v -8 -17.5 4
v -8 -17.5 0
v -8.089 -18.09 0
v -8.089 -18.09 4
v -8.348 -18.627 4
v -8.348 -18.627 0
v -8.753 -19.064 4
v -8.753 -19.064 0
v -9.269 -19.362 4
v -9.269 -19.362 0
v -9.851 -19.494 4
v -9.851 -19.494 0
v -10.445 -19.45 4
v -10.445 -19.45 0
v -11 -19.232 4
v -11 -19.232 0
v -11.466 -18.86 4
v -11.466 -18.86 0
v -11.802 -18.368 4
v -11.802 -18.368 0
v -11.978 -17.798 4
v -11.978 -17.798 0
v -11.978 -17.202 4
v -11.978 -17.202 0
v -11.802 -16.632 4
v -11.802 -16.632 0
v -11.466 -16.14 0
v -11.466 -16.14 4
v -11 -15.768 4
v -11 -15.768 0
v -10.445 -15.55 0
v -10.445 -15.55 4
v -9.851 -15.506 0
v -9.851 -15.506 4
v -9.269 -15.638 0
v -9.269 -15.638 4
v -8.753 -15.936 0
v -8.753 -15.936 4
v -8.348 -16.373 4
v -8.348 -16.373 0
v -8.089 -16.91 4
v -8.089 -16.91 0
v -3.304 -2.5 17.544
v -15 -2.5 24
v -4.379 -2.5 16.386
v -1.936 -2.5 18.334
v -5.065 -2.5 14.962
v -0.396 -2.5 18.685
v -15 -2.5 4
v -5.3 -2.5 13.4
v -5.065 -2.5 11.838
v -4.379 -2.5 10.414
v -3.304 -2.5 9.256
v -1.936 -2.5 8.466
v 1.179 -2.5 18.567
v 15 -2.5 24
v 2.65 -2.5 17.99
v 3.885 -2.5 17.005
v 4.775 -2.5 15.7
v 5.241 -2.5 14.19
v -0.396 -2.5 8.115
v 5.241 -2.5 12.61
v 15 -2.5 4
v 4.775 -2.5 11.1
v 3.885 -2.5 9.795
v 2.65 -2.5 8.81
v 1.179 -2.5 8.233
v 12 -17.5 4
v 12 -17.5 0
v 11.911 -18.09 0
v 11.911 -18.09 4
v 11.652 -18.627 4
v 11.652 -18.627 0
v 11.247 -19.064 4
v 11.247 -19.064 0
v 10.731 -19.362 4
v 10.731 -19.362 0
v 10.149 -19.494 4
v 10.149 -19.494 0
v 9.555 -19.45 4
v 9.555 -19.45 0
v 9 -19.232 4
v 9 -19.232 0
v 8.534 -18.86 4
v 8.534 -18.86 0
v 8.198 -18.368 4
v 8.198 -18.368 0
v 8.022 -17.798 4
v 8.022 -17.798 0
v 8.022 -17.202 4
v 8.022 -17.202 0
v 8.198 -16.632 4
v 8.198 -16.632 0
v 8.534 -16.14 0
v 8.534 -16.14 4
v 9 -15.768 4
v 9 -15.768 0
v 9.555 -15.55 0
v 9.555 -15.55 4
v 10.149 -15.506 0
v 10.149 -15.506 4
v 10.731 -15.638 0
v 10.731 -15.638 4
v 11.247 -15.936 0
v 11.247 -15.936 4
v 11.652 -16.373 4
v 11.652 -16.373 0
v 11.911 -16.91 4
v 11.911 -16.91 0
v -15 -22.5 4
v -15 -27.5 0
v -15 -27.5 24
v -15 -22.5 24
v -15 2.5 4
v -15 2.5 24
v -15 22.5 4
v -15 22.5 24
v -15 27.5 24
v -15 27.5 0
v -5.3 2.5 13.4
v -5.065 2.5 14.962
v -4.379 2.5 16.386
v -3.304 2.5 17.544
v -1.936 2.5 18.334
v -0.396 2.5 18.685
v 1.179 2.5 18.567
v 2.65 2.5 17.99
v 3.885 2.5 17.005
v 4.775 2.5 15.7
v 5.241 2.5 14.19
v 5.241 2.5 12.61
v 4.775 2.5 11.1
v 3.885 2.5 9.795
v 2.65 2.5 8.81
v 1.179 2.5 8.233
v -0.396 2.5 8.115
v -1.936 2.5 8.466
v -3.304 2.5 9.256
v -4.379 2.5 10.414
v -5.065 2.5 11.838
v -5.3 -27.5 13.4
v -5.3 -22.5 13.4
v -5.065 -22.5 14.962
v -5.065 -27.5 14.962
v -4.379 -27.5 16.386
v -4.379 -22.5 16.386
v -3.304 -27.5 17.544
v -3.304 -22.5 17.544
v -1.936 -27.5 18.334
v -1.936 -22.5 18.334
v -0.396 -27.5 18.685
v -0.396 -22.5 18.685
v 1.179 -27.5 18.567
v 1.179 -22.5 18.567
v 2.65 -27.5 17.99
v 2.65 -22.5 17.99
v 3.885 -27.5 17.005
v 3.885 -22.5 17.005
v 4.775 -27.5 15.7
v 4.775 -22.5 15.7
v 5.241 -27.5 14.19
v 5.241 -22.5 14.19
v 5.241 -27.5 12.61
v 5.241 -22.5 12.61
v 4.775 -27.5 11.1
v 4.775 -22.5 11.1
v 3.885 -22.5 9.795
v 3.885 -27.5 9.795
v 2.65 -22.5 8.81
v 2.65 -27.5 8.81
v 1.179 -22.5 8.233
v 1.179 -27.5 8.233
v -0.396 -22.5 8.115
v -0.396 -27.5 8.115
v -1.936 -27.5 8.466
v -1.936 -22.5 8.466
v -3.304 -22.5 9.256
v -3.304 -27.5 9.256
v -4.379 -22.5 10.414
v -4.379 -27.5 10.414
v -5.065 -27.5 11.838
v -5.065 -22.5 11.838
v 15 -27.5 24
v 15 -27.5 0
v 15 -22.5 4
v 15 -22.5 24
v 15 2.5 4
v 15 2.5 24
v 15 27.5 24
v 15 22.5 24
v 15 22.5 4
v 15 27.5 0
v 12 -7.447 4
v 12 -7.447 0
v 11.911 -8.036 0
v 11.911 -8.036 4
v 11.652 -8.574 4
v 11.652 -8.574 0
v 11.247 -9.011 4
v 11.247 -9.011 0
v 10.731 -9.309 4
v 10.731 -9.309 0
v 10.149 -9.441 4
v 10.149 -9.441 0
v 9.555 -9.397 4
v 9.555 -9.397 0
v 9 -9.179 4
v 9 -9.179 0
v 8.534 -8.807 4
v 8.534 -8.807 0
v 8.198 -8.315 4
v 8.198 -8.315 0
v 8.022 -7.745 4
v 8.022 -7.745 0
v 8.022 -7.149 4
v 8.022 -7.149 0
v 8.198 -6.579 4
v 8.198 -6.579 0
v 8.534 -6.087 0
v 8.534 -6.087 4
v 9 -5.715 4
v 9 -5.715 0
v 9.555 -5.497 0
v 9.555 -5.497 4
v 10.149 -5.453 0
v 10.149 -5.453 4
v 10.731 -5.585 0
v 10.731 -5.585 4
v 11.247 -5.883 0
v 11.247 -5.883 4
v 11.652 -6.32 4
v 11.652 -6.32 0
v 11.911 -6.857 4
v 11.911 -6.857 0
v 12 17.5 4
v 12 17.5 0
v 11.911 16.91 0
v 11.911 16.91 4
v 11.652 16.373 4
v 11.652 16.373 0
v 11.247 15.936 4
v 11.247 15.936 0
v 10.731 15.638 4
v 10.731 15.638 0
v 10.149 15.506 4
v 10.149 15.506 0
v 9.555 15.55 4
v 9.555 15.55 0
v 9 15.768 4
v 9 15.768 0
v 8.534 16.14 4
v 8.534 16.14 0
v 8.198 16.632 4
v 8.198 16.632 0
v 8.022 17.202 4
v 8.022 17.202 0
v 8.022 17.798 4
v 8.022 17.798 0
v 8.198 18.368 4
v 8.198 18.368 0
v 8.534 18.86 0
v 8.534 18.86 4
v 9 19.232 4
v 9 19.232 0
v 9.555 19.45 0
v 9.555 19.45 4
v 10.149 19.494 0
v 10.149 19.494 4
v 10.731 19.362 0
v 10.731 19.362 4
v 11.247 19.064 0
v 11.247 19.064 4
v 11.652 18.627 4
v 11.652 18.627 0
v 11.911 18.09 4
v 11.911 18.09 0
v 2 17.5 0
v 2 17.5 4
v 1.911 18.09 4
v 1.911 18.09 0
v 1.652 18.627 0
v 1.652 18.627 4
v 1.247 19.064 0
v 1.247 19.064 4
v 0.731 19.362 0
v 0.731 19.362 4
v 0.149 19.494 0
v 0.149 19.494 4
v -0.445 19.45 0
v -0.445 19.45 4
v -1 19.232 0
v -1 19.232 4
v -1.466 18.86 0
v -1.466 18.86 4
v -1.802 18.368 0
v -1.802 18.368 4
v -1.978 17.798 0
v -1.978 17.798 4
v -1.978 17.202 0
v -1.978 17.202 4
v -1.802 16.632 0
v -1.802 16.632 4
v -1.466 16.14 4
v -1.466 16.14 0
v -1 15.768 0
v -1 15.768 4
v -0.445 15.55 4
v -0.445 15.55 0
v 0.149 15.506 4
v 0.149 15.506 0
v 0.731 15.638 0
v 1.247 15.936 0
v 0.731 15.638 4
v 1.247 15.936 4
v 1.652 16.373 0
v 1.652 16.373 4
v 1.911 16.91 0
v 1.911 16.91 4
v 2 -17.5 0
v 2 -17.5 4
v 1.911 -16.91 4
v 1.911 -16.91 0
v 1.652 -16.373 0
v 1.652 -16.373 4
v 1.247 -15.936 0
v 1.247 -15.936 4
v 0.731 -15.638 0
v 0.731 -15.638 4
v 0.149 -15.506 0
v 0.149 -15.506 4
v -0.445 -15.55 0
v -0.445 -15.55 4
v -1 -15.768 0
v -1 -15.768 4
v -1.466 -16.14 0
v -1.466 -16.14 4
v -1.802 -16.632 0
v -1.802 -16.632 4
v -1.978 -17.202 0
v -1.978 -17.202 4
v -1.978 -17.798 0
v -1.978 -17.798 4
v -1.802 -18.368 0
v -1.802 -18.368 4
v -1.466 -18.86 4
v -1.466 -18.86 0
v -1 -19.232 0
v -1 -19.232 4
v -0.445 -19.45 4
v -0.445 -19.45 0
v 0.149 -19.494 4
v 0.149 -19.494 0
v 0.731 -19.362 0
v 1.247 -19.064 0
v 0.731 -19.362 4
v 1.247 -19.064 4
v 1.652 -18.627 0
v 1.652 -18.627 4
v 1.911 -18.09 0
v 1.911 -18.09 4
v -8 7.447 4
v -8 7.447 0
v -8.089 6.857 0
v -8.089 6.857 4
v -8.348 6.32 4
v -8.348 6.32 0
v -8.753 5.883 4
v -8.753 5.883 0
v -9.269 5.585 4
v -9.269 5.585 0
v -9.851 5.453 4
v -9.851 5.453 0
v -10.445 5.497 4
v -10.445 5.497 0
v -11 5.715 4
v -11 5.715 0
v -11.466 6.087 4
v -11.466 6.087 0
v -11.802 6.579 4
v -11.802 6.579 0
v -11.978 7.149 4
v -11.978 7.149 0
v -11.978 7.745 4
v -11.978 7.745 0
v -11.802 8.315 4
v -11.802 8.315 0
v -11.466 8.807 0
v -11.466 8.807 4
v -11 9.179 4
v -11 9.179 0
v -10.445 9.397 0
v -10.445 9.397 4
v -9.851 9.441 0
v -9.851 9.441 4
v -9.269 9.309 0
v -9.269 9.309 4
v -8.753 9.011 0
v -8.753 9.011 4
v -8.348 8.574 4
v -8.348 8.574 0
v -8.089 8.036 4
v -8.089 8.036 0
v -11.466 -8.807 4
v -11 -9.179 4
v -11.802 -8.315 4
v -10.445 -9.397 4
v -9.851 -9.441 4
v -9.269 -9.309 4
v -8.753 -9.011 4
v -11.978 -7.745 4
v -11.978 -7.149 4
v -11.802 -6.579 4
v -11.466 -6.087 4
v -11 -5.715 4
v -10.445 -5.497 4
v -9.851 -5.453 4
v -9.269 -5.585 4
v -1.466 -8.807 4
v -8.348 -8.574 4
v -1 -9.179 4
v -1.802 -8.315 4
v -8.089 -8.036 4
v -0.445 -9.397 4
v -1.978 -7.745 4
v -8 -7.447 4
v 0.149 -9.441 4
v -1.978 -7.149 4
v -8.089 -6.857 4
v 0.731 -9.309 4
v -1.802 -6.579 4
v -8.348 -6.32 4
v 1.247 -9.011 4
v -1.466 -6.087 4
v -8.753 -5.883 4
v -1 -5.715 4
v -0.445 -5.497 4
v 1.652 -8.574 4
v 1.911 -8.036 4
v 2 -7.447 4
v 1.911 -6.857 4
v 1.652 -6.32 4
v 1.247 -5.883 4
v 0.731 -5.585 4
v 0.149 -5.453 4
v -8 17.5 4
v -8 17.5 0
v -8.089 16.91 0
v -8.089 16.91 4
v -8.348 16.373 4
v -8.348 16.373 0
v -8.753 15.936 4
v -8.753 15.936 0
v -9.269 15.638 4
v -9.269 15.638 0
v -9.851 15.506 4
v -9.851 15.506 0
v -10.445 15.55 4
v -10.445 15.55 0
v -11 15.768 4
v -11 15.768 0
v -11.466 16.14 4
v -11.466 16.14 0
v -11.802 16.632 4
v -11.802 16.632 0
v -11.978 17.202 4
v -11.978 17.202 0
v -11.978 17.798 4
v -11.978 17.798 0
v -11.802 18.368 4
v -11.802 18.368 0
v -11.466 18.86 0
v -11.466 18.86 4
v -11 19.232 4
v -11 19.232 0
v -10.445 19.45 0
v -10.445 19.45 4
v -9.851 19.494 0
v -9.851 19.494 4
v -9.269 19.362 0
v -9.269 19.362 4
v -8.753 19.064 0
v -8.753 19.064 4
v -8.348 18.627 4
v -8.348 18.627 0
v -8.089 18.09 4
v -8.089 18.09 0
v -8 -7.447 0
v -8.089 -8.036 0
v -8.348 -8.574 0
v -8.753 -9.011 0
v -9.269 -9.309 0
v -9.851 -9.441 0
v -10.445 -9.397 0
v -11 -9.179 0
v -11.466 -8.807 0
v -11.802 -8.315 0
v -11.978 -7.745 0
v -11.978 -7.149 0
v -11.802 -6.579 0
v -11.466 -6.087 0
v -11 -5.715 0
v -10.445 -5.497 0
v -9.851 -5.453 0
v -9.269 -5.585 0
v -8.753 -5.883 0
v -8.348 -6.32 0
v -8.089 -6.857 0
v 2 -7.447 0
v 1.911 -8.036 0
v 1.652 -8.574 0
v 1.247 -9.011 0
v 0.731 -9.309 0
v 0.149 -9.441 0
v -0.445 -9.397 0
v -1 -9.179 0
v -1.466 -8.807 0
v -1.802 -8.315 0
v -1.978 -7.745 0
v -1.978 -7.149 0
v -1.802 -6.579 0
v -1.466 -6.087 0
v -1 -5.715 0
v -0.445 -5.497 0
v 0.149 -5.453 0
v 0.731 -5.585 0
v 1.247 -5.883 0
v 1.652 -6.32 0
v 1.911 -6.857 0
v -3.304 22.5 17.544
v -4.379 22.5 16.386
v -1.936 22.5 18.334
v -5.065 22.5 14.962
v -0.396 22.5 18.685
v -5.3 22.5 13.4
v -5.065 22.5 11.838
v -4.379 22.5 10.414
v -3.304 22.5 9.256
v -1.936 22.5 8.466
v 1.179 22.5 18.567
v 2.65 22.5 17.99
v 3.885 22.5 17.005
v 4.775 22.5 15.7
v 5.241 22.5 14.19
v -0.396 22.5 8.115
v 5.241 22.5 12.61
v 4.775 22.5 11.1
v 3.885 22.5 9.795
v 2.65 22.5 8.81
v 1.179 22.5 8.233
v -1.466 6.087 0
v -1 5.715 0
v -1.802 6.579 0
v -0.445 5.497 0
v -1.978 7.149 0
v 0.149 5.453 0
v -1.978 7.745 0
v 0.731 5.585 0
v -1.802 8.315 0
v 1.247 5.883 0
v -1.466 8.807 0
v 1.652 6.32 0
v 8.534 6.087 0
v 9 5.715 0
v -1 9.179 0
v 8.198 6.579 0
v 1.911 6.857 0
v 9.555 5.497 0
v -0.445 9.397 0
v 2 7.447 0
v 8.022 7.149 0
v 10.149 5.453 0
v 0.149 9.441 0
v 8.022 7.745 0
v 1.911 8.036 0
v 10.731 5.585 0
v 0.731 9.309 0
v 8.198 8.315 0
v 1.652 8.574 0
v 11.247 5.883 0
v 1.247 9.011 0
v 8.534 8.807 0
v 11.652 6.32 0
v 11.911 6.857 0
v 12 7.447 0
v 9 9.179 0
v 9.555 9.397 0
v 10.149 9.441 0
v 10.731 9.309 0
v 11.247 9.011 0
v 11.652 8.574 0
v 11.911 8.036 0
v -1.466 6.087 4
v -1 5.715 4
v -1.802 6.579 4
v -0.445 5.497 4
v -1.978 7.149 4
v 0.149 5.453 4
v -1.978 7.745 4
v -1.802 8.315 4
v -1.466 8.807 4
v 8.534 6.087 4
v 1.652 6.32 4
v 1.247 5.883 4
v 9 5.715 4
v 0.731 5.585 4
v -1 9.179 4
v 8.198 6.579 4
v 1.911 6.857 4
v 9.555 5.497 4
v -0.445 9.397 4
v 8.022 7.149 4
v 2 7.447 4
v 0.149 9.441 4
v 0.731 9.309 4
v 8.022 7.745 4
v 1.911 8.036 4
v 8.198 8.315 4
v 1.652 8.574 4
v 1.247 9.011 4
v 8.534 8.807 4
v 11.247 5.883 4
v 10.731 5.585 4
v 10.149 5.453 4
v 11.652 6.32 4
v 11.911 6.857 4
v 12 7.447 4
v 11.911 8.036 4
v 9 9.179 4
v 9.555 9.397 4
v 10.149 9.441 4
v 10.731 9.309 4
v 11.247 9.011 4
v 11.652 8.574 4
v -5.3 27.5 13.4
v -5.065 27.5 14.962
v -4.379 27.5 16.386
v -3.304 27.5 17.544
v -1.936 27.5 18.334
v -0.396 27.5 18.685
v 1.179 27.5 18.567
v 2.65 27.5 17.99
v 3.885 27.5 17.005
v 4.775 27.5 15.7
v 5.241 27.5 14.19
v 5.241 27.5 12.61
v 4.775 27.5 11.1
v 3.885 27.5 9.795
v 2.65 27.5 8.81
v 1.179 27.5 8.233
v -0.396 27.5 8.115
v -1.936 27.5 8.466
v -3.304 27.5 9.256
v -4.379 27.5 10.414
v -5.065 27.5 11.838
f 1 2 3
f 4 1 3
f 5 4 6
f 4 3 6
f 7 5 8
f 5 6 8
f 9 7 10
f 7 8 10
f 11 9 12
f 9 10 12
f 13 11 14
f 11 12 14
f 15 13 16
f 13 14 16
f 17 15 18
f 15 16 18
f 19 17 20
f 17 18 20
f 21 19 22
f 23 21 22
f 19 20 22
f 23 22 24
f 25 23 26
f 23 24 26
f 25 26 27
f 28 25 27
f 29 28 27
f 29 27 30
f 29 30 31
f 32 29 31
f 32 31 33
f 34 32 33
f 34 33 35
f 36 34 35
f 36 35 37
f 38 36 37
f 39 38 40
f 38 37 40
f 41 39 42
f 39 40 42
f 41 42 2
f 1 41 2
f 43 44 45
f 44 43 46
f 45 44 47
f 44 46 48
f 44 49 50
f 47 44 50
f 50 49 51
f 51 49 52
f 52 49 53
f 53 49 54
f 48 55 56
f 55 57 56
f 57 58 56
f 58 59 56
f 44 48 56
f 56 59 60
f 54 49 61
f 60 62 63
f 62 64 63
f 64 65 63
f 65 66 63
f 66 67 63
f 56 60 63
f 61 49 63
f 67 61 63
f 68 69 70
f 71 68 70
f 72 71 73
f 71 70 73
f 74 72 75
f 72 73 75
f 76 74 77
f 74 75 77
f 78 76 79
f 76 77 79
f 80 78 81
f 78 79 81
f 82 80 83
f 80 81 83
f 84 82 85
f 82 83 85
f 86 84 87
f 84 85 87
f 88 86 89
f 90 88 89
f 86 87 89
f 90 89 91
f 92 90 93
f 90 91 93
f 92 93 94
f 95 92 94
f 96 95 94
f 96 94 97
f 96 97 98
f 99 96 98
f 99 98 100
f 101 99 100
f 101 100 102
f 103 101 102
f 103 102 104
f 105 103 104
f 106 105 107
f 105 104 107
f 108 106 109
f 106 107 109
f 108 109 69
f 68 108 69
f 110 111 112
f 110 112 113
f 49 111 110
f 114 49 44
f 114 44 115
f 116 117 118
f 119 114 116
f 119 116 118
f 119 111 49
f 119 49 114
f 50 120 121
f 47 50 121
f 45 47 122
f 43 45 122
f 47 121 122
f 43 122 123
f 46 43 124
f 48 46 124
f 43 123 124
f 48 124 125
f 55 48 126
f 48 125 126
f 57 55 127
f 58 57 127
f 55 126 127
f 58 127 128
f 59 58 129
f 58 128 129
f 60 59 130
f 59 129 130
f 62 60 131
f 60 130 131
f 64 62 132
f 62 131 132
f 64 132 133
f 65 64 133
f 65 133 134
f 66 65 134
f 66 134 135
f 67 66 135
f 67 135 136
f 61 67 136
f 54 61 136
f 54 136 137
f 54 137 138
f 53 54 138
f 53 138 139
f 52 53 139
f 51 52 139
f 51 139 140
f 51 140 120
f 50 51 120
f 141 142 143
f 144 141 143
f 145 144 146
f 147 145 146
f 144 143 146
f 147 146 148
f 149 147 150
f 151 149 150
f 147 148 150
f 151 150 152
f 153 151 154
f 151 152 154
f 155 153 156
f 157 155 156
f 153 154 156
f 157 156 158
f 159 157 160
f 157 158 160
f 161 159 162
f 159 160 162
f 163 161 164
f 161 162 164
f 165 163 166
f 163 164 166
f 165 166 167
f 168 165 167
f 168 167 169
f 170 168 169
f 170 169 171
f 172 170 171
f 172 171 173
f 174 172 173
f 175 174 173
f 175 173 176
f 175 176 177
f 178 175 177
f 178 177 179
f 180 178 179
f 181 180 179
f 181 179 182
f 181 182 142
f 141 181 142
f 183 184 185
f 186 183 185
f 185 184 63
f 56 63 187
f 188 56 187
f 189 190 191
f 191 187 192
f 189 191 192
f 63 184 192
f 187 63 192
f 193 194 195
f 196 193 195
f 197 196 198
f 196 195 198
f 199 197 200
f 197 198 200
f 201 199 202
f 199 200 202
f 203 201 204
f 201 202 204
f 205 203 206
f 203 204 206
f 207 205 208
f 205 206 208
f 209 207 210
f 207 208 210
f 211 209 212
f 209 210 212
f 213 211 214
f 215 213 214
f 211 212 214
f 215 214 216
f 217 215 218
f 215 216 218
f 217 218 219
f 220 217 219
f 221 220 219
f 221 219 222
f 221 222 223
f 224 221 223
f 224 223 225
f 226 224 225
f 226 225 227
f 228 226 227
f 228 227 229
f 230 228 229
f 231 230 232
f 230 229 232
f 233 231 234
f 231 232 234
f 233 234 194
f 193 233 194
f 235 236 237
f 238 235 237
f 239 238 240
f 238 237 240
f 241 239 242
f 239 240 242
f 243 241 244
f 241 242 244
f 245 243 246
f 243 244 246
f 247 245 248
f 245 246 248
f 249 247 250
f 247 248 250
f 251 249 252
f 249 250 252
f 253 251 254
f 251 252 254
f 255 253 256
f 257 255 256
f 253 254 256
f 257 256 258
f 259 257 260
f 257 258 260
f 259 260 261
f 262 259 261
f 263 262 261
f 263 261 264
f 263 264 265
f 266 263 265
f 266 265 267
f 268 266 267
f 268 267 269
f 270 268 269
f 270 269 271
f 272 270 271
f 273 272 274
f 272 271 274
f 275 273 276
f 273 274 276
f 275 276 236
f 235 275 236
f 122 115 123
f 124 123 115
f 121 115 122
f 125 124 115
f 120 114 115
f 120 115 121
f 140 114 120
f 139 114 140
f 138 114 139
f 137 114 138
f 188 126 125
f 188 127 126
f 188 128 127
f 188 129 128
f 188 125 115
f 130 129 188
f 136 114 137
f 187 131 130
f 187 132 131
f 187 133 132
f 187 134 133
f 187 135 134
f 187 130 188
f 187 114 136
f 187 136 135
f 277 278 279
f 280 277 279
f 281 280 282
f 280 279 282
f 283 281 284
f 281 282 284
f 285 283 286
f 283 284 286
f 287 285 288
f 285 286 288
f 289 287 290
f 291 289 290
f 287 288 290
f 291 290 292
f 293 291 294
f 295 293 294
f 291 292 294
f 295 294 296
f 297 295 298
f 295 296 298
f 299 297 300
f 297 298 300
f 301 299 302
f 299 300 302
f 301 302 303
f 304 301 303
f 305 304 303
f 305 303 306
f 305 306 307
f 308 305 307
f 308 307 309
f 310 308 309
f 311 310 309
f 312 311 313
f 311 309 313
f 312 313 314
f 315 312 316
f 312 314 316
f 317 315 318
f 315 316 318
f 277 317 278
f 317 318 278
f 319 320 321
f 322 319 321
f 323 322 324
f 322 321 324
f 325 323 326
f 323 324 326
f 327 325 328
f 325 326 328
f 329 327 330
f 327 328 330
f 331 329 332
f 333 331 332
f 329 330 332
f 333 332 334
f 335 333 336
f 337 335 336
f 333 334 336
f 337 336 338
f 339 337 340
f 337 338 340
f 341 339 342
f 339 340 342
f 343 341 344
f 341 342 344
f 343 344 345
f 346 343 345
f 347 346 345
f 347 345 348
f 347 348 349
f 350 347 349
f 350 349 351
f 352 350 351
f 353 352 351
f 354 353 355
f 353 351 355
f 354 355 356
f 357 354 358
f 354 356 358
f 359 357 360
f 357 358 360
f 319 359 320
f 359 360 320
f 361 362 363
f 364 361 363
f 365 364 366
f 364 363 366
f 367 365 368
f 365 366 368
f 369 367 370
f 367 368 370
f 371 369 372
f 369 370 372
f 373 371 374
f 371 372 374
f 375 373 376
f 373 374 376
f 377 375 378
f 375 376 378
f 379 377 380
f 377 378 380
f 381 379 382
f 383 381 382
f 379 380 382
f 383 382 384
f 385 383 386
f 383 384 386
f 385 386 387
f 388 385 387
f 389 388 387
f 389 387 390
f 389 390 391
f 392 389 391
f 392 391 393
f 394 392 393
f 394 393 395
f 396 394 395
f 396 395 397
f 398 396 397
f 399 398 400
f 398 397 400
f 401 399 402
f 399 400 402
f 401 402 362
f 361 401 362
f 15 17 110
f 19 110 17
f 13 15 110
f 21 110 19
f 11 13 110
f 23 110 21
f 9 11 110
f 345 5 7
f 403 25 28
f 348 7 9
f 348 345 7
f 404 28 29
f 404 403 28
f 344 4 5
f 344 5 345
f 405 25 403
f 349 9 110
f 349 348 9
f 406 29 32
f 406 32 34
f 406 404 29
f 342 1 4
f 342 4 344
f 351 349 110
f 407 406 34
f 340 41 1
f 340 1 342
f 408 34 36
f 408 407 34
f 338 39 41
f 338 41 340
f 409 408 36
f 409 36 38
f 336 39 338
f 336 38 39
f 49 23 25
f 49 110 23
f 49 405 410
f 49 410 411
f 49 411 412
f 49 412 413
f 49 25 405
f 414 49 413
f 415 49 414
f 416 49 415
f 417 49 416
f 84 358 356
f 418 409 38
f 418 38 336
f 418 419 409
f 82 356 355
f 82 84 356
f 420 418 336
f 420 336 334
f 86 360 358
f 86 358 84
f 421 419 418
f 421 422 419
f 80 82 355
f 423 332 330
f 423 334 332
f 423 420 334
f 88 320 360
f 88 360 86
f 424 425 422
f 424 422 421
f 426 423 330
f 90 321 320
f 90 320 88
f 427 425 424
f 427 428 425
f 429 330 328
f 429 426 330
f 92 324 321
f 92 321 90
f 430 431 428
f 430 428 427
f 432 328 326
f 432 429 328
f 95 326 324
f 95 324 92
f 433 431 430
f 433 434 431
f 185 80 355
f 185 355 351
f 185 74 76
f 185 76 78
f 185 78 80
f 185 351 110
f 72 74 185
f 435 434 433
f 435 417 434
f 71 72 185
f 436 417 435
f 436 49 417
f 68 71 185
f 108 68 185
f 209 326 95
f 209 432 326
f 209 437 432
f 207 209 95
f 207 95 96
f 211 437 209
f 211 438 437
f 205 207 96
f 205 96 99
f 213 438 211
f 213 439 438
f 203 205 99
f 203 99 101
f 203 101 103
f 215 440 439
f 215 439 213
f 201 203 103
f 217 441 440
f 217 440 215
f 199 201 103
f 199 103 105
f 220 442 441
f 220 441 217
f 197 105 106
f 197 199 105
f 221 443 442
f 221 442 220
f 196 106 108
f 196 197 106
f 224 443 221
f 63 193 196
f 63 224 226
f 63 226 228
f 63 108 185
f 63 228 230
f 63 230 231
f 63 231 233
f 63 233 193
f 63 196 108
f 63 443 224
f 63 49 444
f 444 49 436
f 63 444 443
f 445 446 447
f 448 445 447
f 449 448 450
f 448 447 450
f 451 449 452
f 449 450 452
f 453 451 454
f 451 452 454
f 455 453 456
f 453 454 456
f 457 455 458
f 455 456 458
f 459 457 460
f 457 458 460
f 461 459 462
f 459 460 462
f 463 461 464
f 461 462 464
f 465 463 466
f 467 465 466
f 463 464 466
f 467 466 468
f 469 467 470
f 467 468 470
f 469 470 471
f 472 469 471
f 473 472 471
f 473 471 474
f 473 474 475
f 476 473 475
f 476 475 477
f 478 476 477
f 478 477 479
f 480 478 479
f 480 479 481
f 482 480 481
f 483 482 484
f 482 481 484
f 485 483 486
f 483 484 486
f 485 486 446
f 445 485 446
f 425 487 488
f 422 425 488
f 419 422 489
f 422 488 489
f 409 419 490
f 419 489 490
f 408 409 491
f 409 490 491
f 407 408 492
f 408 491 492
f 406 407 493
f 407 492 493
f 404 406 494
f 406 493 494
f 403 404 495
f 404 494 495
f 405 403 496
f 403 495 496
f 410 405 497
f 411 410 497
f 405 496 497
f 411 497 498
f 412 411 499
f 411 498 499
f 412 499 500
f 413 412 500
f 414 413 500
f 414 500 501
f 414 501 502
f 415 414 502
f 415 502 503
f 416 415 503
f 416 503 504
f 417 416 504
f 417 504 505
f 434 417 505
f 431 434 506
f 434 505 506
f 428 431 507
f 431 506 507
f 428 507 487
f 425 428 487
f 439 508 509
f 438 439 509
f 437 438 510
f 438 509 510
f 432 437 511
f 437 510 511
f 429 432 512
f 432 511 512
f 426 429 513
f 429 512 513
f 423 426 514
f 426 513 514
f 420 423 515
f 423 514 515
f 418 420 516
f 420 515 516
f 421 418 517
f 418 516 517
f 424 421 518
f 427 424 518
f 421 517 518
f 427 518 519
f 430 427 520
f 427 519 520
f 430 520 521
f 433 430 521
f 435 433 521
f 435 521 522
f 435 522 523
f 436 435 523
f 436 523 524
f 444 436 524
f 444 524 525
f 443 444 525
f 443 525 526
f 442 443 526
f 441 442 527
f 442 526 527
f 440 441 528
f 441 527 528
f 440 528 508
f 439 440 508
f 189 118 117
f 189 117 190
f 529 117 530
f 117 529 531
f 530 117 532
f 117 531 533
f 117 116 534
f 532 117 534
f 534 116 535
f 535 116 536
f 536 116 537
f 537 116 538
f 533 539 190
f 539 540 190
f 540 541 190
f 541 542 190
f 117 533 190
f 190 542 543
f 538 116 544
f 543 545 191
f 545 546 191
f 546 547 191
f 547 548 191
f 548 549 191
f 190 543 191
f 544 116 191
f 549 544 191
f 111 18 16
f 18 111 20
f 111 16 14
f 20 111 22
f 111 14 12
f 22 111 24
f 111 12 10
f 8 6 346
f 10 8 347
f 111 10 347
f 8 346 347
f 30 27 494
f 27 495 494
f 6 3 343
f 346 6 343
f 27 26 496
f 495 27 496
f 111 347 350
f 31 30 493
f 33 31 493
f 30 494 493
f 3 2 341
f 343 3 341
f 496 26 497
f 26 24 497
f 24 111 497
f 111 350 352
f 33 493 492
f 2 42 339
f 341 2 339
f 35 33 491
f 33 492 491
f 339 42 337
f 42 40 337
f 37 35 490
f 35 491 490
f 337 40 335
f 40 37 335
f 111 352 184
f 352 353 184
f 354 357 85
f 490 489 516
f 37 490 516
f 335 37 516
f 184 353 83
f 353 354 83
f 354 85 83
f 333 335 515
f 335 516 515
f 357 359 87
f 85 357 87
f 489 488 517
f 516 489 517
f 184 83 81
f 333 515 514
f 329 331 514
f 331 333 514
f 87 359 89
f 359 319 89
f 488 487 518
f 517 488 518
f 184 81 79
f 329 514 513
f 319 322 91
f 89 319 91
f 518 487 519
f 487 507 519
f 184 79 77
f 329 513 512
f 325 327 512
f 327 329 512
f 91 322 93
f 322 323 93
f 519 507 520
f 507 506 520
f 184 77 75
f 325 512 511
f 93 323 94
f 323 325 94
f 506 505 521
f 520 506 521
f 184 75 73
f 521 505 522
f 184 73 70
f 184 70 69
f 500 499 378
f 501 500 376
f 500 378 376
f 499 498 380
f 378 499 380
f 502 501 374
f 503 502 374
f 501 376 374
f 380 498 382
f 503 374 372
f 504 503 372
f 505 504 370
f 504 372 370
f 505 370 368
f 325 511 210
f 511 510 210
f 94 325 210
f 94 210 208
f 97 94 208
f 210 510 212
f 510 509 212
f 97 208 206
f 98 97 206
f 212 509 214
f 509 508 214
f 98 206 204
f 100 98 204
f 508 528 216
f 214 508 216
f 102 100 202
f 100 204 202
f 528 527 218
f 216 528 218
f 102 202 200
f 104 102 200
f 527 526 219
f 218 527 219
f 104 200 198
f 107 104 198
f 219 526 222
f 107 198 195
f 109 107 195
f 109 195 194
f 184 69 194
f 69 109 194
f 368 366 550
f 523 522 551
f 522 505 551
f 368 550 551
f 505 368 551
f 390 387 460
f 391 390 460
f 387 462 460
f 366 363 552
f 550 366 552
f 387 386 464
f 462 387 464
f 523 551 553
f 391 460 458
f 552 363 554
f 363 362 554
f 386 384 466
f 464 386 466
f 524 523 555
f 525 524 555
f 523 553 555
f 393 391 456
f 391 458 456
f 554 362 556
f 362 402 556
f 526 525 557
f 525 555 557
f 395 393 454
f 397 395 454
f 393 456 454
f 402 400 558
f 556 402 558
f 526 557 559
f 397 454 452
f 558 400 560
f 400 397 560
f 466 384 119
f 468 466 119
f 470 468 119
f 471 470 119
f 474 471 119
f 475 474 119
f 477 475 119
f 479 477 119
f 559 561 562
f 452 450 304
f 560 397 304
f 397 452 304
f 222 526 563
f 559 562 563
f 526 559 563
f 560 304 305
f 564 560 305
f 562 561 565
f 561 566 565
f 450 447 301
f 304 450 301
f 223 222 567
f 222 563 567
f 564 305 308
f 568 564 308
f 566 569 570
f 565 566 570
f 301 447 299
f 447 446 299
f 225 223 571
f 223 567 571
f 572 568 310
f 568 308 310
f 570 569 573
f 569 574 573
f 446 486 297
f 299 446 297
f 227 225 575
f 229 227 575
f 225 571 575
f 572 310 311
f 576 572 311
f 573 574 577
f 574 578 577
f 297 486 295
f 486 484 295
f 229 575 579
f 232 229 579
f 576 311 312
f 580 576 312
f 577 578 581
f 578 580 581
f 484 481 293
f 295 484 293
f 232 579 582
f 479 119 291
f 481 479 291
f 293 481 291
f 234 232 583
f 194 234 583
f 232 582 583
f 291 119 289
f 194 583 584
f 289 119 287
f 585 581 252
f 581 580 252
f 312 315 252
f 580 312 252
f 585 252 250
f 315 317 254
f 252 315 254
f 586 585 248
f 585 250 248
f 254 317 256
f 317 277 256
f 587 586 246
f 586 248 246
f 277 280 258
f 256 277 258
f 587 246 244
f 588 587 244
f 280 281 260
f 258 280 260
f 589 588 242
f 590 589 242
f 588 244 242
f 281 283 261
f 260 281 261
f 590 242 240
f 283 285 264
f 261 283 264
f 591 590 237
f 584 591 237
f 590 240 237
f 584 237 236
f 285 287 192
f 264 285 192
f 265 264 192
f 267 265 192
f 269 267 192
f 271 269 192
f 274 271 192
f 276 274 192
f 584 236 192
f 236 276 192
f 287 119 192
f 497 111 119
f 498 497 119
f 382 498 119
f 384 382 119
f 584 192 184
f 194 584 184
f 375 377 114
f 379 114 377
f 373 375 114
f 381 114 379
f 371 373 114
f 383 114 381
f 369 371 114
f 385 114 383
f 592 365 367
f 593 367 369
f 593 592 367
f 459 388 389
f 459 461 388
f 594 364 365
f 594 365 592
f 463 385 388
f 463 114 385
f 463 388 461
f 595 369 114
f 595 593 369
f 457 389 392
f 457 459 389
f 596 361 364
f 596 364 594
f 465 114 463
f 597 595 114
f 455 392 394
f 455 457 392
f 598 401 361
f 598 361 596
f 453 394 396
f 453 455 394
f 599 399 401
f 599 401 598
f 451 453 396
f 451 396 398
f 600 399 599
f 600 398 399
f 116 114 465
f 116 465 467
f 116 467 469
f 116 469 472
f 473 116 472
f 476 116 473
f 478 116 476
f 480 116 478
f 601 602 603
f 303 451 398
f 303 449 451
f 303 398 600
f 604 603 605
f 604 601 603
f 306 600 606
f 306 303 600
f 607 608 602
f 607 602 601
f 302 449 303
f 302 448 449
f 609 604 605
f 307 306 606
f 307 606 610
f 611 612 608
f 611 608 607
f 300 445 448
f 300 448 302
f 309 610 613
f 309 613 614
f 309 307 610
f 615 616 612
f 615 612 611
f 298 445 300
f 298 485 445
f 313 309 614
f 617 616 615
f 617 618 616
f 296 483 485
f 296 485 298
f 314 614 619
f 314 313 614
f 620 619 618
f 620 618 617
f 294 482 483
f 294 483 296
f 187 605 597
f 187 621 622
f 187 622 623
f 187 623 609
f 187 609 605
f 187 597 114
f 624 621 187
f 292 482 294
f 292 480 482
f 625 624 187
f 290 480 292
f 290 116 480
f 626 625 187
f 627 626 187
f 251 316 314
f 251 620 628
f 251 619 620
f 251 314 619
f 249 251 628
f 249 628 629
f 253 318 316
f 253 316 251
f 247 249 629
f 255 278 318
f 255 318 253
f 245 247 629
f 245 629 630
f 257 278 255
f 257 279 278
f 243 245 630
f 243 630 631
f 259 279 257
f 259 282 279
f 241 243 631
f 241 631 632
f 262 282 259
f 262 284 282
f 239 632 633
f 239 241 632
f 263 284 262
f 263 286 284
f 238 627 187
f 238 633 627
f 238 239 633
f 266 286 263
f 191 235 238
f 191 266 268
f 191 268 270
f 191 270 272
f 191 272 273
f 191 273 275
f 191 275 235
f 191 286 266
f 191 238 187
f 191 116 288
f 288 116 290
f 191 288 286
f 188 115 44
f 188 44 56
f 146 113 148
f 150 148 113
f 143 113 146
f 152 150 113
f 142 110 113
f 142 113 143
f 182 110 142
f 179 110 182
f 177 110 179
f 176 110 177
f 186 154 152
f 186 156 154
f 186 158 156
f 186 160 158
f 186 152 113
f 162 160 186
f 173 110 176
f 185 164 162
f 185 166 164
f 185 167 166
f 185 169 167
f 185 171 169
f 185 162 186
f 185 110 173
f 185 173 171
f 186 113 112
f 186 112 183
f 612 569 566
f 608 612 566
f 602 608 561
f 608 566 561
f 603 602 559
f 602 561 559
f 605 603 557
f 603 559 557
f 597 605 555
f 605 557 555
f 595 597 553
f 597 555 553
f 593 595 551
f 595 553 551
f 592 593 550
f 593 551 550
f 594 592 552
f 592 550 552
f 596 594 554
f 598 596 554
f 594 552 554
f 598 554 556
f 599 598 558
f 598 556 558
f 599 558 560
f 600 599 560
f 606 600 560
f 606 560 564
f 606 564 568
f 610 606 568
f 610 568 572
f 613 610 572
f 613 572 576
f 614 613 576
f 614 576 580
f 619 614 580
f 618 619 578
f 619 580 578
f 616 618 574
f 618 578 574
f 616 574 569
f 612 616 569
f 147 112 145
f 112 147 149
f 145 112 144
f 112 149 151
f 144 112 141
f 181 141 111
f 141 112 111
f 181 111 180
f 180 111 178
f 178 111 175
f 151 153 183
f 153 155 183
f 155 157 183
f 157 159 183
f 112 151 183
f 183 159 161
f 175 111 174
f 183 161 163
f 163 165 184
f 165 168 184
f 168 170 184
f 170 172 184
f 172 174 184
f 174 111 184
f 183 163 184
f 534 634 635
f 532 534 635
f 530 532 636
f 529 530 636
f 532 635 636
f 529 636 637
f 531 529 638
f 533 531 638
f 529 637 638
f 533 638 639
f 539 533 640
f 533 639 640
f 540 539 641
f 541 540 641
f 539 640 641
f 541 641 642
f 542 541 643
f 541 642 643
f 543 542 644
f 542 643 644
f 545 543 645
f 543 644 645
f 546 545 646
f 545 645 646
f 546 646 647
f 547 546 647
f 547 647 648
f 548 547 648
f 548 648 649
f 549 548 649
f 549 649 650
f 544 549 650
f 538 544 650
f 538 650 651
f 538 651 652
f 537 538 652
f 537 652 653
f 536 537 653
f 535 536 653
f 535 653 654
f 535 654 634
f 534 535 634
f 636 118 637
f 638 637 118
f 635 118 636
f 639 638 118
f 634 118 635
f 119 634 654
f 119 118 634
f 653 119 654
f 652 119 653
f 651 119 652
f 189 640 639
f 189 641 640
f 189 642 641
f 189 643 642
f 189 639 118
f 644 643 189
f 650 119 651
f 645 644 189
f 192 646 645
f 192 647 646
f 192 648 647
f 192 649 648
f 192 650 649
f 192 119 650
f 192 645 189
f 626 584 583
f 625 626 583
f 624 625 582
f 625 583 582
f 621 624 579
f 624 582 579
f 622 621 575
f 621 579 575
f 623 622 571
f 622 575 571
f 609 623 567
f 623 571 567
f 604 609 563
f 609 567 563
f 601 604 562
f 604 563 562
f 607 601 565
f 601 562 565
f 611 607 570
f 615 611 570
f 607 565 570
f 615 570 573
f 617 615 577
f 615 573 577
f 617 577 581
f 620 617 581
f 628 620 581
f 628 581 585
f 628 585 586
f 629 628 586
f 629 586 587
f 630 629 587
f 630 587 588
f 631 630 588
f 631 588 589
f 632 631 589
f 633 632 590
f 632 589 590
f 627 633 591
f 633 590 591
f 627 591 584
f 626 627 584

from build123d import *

# Parameters (mm, degrees)
F0_W     = 30
F0_H     = 55
F1_DEPTH = 4
F2_R     = 2
F3_DEPTH = 4
F4_W     = 30
F4_H     = 5
F5_DEPTH = 20
F6_R     = 5.3
F7_DEPTH = 55.001
F8_R     = 2
F9_DEPTH = 4


with BuildPart() as f1:
    # F0 (on Top) → F1 (new body)
    with BuildSketch(Plane.XY):
        Rectangle(F0_W, F0_H)
    extrude(amount=F1_DEPTH)

    # F2 (on face) → F3 (cut)
    with BuildSketch(Plane.XY.offset(4)):
        with Locations((0, -17.5)):
            Circle(F2_R)
        with Locations((0, 17.5)):
            Circle(F2_R)
    extrude(amount=-F3_DEPTH, mode=Mode.SUBTRACT)

    # F4 (on face) → F5 (join)
    with BuildSketch(Plane.XY.offset(4)):
        with Locations((0, 25)):
            Rectangle(F4_W, F4_H)
        Rectangle(F4_W, F4_H)
        with Locations((0, -25)):
            Rectangle(F4_W, F4_H)
    extrude(amount=F5_DEPTH)

    # F6 (on face) → F7 (cut, through all)
    with BuildSketch(Plane(origin=(0, 27.5, 0), x_dir=(-1, 0, 0), z_dir=(0, 1, 0))):
        with Locations((0, 13.4)):
            Circle(F6_R)
    extrude(amount=-F7_DEPTH, mode=Mode.SUBTRACT)

    # F8 (on face) → F9 (cut)
    with BuildSketch(Plane(origin=(0, 0, 0), x_dir=(1, 0, 0), z_dir=(0, 0, -1))):
        with Locations((10, -17.5)):
            Circle(F8_R)
        with Locations((10, -7.446962)):
            Circle(F8_R)
        with Locations((-10, -17.5)):
            Circle(F8_R)
        with Locations((-10, -7.446962)):
            Circle(F8_R)
        with Locations((-10, 7.446962)):
            Circle(F8_R)
        with Locations((-10, 17.5)):
            Circle(F8_R)
        with Locations((10, 17.5)):
            Circle(F8_R)
        with Locations((10, 7.446962)):
            Circle(F8_R)
        with Locations((0, -7.446962)):
            Circle(F8_R)
        with Locations((0, 7.446962)):
            Circle(F8_R)
    extrude(amount=-F9_DEPTH, mode=Mode.SUBTRACT)


solid = f1.part
